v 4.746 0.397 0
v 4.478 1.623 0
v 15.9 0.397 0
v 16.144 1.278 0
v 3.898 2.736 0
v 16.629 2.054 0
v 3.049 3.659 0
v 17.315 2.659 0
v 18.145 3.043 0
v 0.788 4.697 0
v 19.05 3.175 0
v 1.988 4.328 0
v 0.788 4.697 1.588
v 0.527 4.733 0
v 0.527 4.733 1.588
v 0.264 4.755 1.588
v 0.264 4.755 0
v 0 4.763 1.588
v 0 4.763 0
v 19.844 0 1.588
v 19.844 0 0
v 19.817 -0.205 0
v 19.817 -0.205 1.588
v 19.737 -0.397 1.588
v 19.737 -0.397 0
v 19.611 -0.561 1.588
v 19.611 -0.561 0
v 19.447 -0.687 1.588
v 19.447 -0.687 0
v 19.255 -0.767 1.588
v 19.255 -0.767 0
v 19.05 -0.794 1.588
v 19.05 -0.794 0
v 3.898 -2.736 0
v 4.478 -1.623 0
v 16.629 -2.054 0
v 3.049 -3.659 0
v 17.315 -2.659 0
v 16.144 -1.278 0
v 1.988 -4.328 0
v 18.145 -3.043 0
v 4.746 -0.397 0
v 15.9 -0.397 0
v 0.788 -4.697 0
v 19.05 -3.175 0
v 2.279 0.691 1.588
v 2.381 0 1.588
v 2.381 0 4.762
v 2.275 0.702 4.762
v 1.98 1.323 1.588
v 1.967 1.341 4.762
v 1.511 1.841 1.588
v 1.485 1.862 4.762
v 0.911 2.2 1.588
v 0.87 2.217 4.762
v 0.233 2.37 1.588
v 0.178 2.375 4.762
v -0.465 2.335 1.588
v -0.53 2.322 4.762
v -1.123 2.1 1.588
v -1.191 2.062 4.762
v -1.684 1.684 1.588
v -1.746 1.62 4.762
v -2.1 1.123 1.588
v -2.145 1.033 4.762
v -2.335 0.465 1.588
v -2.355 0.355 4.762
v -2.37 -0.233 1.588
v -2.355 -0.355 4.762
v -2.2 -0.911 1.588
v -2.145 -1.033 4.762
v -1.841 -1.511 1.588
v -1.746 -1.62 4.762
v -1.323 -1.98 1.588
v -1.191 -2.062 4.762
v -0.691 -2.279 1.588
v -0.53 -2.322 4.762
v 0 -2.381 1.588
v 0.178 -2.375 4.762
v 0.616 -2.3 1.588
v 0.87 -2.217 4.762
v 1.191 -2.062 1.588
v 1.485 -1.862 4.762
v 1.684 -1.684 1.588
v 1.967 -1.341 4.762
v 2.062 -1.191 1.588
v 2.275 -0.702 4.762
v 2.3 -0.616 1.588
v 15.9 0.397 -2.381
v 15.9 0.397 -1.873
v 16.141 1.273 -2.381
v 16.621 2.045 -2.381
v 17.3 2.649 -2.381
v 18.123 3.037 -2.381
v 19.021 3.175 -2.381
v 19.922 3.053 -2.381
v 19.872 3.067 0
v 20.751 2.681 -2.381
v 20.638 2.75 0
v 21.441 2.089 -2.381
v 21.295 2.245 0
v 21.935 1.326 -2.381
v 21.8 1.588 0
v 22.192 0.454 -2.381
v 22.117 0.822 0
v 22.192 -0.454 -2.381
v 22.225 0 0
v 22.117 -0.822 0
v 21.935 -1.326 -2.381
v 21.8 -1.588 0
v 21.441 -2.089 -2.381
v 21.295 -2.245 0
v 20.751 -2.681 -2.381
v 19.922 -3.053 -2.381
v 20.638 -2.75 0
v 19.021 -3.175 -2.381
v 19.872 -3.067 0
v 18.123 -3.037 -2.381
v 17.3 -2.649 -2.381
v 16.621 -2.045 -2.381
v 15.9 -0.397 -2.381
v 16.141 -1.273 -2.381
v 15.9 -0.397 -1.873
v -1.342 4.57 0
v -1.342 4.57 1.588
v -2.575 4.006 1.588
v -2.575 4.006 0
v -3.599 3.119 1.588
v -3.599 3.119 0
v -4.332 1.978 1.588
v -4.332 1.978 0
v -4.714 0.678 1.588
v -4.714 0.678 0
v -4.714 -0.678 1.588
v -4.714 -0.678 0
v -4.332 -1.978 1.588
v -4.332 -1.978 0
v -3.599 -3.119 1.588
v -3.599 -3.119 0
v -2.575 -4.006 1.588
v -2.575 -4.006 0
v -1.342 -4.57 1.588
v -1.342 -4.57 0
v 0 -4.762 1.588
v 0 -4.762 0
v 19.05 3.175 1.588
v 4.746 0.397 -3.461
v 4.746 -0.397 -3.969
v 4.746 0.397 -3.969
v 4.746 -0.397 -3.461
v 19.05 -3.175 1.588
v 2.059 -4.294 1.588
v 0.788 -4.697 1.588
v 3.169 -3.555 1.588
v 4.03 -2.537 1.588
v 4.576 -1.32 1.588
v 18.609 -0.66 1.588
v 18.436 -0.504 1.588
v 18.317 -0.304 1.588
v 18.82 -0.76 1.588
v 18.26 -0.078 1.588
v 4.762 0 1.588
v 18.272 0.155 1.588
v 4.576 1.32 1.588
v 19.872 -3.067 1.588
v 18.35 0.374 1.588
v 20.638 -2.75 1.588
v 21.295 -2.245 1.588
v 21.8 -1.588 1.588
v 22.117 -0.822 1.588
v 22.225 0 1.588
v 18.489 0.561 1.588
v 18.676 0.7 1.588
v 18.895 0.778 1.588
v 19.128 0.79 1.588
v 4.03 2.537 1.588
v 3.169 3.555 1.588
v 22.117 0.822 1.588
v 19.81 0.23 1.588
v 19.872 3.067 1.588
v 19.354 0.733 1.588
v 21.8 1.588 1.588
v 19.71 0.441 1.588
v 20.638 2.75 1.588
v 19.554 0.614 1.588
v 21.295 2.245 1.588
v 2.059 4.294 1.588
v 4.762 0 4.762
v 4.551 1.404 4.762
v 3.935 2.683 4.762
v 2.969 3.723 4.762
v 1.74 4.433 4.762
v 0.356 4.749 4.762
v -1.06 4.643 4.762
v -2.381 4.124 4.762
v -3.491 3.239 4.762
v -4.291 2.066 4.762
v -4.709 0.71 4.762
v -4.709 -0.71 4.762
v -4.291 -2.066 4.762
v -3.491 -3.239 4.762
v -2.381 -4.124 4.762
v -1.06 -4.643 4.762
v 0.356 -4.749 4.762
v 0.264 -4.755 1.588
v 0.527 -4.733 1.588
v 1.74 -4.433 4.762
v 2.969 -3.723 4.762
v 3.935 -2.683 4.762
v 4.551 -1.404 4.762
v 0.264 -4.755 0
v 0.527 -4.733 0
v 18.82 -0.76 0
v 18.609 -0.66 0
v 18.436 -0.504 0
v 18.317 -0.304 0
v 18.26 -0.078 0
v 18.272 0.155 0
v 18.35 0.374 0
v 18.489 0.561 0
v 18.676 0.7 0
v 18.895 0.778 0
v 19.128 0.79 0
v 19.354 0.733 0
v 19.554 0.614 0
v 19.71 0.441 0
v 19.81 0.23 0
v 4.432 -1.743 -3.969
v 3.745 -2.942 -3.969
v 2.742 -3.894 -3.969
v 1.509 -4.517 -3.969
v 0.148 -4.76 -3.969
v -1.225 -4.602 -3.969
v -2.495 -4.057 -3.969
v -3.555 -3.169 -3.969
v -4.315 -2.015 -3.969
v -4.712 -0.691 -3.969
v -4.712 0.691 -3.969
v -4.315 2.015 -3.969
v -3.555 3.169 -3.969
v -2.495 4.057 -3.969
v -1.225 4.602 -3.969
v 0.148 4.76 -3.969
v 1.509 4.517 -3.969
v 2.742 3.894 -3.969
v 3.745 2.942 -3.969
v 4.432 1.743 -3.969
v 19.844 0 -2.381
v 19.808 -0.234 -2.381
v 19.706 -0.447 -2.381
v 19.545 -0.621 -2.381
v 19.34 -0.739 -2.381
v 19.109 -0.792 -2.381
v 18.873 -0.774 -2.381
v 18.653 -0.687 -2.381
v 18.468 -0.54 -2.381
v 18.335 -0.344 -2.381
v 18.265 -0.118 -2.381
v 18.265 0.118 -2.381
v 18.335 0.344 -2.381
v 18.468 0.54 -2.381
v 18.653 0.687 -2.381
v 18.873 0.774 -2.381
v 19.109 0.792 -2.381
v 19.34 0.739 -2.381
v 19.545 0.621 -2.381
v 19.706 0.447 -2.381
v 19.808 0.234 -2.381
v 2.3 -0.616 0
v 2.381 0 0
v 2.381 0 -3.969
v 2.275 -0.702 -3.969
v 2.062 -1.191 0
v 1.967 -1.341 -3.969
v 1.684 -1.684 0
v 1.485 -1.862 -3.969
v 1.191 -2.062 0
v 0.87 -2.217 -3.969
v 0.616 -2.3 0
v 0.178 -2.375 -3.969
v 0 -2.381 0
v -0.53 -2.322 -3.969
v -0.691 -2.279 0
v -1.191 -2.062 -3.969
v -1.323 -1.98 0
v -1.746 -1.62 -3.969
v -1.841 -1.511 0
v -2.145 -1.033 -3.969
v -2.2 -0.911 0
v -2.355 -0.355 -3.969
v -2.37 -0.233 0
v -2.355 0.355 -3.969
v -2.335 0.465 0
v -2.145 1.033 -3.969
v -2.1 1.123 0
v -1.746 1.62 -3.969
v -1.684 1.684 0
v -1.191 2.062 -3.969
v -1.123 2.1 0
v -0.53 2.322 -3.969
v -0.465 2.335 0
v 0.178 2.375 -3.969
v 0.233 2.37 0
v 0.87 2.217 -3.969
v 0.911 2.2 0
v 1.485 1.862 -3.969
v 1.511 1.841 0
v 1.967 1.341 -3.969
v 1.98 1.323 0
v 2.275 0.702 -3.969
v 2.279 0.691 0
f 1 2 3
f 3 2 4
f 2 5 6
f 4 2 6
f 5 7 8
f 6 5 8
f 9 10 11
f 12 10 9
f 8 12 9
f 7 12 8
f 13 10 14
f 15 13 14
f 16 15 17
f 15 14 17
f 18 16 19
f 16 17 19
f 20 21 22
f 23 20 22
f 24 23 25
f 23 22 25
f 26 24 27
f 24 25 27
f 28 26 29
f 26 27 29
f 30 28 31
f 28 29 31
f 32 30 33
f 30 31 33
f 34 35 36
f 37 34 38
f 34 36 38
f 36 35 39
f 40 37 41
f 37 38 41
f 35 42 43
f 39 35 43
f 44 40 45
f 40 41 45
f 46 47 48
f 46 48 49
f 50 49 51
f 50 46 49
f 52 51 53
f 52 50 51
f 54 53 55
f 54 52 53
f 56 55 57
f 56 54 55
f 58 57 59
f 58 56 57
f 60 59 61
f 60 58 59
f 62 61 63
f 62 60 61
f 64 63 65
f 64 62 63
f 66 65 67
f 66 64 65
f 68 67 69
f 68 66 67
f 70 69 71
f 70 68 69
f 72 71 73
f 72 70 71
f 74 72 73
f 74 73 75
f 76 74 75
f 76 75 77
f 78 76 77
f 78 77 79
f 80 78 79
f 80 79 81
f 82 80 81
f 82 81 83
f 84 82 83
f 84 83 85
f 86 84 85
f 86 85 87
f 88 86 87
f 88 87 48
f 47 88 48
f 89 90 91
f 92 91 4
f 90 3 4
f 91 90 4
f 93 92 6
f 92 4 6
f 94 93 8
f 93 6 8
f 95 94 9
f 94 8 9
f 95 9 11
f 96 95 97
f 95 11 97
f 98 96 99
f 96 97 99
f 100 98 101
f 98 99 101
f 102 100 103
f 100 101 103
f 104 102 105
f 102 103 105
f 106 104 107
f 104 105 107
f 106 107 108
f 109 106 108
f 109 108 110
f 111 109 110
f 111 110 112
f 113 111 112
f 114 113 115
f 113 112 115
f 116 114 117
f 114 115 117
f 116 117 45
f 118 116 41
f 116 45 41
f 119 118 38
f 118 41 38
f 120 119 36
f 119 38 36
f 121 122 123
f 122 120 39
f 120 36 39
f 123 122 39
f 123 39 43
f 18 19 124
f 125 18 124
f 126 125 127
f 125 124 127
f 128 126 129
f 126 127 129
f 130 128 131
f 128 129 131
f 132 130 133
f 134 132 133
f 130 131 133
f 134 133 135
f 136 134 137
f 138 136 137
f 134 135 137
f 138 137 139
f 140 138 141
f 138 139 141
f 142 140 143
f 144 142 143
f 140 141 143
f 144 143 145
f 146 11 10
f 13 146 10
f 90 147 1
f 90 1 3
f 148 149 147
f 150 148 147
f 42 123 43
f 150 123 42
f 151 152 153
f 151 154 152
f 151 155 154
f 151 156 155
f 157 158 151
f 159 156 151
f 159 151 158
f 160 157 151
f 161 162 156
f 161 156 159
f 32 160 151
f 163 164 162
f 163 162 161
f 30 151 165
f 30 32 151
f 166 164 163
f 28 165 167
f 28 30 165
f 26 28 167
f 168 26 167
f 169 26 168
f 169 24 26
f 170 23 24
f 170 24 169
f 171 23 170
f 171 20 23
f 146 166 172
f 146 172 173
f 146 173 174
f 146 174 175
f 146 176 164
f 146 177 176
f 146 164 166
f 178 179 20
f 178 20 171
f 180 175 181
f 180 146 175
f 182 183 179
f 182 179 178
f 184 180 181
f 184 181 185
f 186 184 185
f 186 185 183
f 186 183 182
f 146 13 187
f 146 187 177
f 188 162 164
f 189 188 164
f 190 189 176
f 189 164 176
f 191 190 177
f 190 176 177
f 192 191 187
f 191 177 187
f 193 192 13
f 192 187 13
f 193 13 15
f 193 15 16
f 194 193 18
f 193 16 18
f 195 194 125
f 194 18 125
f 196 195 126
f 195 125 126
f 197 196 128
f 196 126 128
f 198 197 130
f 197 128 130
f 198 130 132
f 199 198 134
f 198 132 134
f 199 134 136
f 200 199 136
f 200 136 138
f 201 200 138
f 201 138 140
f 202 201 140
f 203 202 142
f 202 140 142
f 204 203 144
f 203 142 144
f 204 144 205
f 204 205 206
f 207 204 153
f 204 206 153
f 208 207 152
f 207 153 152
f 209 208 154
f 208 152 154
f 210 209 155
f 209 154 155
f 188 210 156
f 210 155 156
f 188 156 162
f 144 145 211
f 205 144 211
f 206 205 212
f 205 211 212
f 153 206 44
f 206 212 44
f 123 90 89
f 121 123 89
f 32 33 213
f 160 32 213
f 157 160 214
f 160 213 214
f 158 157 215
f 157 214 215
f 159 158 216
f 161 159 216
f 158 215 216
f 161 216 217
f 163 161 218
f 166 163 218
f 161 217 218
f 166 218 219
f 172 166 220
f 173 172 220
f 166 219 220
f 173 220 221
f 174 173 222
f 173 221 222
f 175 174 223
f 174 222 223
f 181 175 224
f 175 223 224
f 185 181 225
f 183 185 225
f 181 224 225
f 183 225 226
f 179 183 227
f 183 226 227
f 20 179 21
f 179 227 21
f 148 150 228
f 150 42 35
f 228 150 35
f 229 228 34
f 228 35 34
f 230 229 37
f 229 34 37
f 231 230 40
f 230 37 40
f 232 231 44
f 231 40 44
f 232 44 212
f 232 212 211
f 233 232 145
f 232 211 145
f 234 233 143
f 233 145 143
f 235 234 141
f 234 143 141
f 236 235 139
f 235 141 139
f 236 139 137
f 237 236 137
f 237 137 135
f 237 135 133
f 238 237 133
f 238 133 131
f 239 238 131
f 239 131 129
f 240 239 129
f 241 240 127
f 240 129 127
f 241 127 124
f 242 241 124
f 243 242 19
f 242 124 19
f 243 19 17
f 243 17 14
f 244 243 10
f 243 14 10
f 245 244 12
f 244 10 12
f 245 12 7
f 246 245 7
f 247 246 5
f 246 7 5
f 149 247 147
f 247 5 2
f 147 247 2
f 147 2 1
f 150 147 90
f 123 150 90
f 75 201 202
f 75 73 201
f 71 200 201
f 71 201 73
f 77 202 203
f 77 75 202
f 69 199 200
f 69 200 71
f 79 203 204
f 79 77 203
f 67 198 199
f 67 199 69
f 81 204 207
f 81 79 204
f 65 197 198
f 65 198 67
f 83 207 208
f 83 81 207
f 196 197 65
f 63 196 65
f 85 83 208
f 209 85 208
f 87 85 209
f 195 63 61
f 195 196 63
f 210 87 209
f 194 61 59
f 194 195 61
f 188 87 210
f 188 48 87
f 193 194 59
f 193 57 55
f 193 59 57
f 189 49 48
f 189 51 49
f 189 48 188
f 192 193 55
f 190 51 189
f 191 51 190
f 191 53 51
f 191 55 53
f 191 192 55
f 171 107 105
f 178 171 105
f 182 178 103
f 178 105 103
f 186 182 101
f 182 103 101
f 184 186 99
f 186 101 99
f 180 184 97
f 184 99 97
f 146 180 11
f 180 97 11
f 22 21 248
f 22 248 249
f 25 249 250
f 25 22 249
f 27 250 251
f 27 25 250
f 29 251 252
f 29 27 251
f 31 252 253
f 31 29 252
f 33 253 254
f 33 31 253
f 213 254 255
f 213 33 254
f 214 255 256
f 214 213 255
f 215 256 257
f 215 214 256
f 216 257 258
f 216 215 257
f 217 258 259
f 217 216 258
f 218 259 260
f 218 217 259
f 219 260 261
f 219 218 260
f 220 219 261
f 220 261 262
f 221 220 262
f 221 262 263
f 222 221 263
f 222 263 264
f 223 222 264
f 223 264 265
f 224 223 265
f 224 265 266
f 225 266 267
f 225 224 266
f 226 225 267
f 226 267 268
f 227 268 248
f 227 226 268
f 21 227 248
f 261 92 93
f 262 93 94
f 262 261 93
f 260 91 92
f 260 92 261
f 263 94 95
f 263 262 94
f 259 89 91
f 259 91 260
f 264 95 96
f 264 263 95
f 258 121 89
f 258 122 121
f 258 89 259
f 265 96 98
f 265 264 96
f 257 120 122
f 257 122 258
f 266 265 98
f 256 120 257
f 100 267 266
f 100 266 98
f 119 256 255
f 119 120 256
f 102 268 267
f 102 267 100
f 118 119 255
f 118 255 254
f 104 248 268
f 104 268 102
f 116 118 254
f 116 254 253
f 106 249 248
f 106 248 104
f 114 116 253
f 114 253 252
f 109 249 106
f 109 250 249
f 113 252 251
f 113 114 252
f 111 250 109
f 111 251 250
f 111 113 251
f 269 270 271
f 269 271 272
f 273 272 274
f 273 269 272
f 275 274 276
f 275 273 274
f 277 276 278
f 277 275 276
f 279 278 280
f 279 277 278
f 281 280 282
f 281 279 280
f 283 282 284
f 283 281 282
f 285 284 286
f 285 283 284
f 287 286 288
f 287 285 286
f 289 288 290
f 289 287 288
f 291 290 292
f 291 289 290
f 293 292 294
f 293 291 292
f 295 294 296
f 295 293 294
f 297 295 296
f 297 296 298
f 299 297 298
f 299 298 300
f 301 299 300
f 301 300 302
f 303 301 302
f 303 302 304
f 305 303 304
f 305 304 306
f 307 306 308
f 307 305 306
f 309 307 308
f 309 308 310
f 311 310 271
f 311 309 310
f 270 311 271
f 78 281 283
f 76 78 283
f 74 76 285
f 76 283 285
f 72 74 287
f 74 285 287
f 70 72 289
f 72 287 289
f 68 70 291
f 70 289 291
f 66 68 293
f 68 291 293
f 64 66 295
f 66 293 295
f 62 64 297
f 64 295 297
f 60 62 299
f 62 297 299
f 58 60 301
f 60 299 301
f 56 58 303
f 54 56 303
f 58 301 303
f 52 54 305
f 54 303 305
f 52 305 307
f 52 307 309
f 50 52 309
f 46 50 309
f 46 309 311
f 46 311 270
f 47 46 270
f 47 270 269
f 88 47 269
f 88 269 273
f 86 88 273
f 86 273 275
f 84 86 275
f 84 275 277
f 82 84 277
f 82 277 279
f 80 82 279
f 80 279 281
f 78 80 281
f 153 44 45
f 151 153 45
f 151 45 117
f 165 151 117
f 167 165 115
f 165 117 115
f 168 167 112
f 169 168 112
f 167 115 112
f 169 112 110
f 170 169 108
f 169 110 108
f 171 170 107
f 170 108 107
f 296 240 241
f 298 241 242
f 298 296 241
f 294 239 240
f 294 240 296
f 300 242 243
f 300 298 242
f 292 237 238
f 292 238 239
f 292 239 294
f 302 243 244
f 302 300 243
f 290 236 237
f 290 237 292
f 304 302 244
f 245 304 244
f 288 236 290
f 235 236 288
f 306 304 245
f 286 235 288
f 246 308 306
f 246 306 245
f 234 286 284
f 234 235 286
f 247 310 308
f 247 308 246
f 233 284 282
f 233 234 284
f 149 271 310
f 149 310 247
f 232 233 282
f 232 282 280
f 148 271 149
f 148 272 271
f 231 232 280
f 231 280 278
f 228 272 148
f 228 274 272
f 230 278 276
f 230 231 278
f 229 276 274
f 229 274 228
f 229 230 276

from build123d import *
from build123d import SkipClean  # not in build123d's __all__

# Parameters (mm, degrees)
F1_DEPTH  = 1.5875
F2_R      = 4.7625
F2_R_2    = 2.38125
F3_DEPTH  = 3.175
F4_R      = 4.7625
F4_R_2    = 2.38125
F5_DEPTH  = 3.96875
F6_R      = 3.175
F6_R_2    = 0.79375
F7_DEPTH  = 2.38125
F9_DEPTH  = 3.96875
F11_DEPTH = 25.4


with BuildPart() as f1:
    # F0 (on Top) → F1 (new body)
    with BuildSketch(Plane.XY):
        with BuildLine():
            Line((0.7882758621, 4.6968103448), (0, 4.7625))
            ThreePointArc((0, 4.7625), (-4.7625, 0), (0, -4.7625))
            Line((0, -4.7625), (0.7882758621, -4.6968103448))
            ThreePointArc((0.7882758621, -4.6968103448), (3.6356271841, -3.076299925), (4.7625, 0))
            ThreePointArc((4.7625, 0), (3.6356271841, 3.076299925), (0.7882758621, 4.6968103448))
        make_face()
        with BuildLine():
            ThreePointArc((2.38125, 0), (1.6837980227, -1.6837980227), (0, -2.38125))
            ThreePointArc((0, -2.38125), (-1.6837980227, 1.6837980227), (2.38125, 0))
        make_face(mode=Mode.SUBTRACT)
        with BuildLine():
            ThreePointArc((0.7882758621, 4.6968103448), (0.3955040978, 4.7460491736), (0, 4.7625))
            Line((0, 4.7625), (0.7882758621, 4.6968103448))
        make_face()
        with BuildLine():
            Line((0.7882758621, -4.6968103448), (0, -4.7625))
            ThreePointArc((0, -4.7625), (0.3955040978, -4.7460491736), (0.7882758621, -4.6968103448))
        make_face()
        with BuildLine():
            Line((19.05, 3.175), (0.7882758621, 4.6968103448))
            ThreePointArc((0.7882758621, 4.6968103448), (3.6356271841, 3.076299925), (4.7625, 0))
            ThreePointArc((4.7625, 0), (3.6356271841, -3.076299925), (0.7882758621, -4.6968103448))
            Line((0.7882758621, -4.6968103448), (19.05, -3.175))
            ThreePointArc((19.05, -3.175), (15.875, 0), (19.05, 3.175))
        make_face()
        with BuildLine():
            ThreePointArc((22.225, 0), (21.2950640303, 2.2450640303), (19.05, 3.175))
            ThreePointArc((19.05, 3.175), (15.875, 0), (19.05, -3.175))
            ThreePointArc((19.05, -3.175), (21.2950640303, -2.2450640303), (22.225, 0))
        make_face()
        with BuildLine():
            ThreePointArc((19.84375, 0), (19.6112660076, -0.5612660076), (19.05, -0.79375))
            ThreePointArc((19.05, -0.79375), (18.4887339924, 0.5612660076), (19.84375, 0))
        make_face(mode=Mode.SUBTRACT)
    extrude(amount=F1_DEPTH)

    # F2 (on face) → F3 (join)
    with BuildSketch(Plane.XY.offset(1.5875)):
        Circle(F2_R)
        Circle(F2_R_2, mode=Mode.SUBTRACT)
    with SkipClean():  # cleaning this boolean's faces spoils the solid; the shape is the same uncleaned
        extrude(amount=F3_DEPTH)

    # F4 (on face) → F5 (join)
    with BuildSketch(Plane(origin=(0, 0, 0), x_dir=(1, 0, 0), z_dir=(0, 0, -1))):
        Circle(F4_R)
        Circle(F4_R_2, mode=Mode.SUBTRACT)
    extrude(amount=F5_DEPTH)

    # F6 (on face) → F7 (join)
    with BuildSketch(Plane(origin=(0, 0, 0), x_dir=(1, 0, 0), z_dir=(0, 0, -1))):
        with Locations((19.05, 0)):
            Circle(F6_R)
        with Locations((19.05, 0)):
            Circle(F6_R_2, mode=Mode.SUBTRACT)
    extrude(amount=F7_DEPTH)

    # F8 (on face) → F9 (join, through all)
    with BuildSketch(Plane(origin=(0, 0, -3.96875), x_dir=(1, 0, 0), z_dir=(0, 0, -1))):
        with BuildLine():
            ThreePointArc((4.7459347324, 0.396875), (4.758356881, 0.1986102803), (4.7625, 0))
            ThreePointArc((4.7625, 0), (4.758356881, -0.1986102803), (4.7459347324, -0.396875))
            Line((4.7459347324, -0.396875), (15.8999023453, -0.396875))
            ThreePointArc((15.8999023453, -0.396875), (15.875, 0), (15.8999023453, 0.396875))
            Line((15.8999023453, 0.396875), (4.7459347324, 0.396875))
        make_face()
    extrude(amount=-F9_DEPTH)

    # F10 (on face) → F11 (cut)
    with BuildSketch(Plane(origin=(0, 0.396875, 0), x_dir=(-1, 0, 0), z_dir=(0, 1, 0))):
        Polygon((-4.7459347324, -3.96875), (-4.7459347324, -3.46075), (-15.8999023453, -1.87325), (-15.8999023453, -2.38125), (-15.8999023453, -3.96875), align=None)
    extrude(amount=-F11_DEPTH, mode=Mode.SUBTRACT)


solid = f1.part
